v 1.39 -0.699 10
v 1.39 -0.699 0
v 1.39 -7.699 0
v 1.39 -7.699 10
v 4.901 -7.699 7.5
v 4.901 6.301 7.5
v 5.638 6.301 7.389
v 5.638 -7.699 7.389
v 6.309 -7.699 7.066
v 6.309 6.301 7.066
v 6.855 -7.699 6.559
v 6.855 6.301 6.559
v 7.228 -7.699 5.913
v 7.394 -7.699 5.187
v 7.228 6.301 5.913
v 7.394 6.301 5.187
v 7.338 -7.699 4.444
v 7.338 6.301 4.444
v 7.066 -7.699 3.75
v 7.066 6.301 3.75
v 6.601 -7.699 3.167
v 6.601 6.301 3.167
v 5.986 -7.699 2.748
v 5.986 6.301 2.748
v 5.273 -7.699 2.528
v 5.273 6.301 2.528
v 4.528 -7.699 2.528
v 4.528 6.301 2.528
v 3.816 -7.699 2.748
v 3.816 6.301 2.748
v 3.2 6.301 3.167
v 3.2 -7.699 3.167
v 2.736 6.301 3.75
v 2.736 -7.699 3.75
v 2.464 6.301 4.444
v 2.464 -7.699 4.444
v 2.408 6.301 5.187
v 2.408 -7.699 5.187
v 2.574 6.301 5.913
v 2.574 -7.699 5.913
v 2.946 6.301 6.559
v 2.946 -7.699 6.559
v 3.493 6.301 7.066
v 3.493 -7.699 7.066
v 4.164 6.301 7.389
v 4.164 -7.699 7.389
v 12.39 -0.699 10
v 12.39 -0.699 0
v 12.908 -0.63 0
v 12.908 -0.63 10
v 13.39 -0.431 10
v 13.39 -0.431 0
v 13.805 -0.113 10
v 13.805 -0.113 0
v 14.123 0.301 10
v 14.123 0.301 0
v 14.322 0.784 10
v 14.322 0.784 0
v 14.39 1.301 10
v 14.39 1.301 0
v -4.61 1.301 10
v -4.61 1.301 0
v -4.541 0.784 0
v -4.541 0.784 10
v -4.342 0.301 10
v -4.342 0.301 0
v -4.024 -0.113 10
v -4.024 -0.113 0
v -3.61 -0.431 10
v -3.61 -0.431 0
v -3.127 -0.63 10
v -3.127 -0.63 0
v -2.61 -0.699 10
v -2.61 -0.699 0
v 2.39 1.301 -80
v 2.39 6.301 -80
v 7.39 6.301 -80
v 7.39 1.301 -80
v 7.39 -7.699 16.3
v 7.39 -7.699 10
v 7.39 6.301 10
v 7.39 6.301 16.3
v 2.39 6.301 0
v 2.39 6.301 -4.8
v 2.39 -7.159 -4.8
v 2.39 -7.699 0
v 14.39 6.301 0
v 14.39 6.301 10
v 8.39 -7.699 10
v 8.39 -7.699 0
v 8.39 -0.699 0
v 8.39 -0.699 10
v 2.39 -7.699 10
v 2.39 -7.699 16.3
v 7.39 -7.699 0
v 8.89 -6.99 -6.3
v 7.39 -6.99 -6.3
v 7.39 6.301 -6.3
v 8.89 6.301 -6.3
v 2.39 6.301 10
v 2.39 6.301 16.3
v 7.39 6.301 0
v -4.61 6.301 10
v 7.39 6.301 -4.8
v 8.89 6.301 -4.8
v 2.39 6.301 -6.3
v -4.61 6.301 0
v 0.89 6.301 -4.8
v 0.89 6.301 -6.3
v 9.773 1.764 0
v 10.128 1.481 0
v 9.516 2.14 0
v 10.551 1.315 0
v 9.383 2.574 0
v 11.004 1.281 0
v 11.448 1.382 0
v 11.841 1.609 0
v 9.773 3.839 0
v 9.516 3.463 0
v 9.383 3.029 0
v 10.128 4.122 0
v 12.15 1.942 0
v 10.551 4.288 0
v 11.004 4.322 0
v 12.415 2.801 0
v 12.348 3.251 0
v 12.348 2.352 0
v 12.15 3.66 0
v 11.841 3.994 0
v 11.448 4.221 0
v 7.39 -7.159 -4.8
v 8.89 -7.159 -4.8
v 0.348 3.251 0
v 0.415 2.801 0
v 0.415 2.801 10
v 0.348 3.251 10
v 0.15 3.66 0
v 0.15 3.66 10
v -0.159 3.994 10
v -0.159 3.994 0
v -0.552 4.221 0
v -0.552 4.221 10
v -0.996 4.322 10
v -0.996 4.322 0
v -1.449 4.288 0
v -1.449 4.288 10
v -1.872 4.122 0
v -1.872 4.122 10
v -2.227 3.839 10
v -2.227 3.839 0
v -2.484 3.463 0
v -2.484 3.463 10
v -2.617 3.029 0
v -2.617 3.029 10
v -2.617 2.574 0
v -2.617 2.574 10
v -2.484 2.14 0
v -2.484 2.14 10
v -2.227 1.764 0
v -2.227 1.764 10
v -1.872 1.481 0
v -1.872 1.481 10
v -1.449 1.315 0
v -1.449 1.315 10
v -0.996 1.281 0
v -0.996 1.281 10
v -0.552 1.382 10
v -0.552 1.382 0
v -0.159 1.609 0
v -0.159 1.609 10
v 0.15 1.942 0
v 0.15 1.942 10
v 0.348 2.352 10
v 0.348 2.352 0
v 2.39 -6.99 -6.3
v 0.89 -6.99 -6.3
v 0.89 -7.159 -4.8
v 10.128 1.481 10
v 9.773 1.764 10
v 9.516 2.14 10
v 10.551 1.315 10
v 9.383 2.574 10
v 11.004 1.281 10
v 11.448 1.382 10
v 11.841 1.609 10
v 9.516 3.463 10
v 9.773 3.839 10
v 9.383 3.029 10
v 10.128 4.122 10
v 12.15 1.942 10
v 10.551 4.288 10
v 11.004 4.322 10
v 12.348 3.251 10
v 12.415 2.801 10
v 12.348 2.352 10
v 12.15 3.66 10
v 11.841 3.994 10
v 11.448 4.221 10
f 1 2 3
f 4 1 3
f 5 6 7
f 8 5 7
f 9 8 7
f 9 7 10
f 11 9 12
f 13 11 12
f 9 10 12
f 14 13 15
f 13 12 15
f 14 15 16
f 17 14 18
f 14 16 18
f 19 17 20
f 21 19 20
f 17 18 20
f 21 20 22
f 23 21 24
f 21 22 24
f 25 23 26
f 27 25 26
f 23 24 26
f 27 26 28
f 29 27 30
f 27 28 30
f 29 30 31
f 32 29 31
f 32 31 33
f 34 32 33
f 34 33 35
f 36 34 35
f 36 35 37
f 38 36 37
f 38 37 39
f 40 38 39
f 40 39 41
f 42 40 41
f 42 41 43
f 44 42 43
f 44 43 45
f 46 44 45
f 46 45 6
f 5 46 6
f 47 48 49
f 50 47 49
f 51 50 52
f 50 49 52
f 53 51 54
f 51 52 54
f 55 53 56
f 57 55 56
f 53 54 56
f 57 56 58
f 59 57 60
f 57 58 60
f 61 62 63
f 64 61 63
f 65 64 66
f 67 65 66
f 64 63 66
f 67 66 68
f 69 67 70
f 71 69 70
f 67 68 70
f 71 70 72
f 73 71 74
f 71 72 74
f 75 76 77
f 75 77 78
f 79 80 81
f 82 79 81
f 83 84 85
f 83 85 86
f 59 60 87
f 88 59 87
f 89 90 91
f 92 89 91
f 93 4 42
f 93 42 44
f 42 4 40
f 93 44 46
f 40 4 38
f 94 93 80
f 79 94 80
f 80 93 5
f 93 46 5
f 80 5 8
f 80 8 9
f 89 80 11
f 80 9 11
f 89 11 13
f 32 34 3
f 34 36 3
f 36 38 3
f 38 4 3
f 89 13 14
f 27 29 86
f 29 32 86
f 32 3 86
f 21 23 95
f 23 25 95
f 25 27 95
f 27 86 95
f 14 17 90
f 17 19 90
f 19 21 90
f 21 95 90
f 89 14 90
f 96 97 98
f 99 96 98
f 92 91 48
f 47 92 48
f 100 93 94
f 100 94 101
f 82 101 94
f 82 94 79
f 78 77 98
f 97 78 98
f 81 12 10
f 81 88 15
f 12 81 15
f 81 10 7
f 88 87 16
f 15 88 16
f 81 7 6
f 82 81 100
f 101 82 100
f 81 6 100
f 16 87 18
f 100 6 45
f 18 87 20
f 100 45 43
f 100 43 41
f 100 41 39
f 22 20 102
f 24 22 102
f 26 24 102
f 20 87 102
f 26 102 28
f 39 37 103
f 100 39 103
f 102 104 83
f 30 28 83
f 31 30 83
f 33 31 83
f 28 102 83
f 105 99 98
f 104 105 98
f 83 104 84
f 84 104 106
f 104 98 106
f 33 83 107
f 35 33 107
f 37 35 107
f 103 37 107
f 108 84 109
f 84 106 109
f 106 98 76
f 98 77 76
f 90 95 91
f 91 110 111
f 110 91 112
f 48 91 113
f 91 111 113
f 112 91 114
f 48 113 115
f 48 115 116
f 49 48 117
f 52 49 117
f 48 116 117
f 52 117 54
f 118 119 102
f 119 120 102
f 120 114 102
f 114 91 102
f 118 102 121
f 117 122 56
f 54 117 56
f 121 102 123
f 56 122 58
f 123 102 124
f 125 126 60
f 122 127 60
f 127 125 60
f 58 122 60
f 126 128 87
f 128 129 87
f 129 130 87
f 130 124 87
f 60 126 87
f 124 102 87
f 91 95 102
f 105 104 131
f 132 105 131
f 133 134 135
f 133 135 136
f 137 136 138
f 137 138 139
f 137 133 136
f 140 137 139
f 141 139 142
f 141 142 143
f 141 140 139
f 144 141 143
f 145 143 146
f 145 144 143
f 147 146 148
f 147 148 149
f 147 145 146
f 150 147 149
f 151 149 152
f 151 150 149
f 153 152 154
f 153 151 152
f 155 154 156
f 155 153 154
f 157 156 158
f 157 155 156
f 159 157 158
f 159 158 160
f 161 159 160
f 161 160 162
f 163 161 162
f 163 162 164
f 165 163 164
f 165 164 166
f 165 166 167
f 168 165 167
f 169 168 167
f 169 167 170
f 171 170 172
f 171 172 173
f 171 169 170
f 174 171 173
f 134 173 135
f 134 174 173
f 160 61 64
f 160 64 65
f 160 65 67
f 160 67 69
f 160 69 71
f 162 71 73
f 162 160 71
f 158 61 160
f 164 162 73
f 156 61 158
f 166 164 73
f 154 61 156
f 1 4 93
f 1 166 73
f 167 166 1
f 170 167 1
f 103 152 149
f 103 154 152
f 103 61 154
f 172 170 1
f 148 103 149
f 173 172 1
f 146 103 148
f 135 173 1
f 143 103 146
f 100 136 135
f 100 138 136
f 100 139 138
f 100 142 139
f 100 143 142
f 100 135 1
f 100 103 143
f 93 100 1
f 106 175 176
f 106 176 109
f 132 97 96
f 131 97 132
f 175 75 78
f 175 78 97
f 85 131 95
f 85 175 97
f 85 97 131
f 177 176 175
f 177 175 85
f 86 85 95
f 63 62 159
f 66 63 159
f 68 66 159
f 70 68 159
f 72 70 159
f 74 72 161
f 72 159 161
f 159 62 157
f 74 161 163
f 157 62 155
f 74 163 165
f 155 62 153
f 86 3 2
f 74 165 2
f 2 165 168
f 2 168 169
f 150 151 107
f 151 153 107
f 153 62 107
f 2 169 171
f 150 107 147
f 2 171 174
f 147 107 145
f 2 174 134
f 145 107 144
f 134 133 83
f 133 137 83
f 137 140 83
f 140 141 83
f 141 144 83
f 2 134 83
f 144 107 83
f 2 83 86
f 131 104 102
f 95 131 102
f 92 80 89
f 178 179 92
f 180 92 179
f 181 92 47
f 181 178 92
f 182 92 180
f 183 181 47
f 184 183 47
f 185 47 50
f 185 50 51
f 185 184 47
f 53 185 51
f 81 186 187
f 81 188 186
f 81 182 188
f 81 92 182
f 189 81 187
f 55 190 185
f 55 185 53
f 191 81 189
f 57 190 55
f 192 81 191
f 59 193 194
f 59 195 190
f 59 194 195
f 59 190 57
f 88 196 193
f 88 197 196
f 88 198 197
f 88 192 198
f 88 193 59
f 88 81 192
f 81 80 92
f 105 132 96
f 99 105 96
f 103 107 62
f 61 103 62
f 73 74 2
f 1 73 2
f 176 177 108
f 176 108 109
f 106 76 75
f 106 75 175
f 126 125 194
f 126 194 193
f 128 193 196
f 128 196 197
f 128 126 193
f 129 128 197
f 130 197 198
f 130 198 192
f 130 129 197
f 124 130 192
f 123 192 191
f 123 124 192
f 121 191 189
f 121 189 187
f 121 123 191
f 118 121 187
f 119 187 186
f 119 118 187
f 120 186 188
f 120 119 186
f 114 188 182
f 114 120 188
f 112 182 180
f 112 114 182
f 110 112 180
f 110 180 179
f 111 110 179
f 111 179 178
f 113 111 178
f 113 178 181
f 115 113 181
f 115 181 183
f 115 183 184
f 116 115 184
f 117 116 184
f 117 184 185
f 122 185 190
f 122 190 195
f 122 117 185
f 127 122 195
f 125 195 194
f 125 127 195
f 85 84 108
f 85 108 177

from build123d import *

# Parameters (mm, degrees)
SKETCH_1_R           = 1.525
EXTRUDE_1_DEPTH      = 10
EXTRUDE_2_DEPTH      = 2.5
EXTRUDE_2_DEPTH_BACK = 2.5
SKETCH_4_W           = 5
SKETCH_4_H           = 14
EXTRUDE_3_DEPTH      = 6.3
CUT_EXTRUDE_1_REACH  = 84.481
SKETCH_5_R           = 2.5
EXTRUDE_5_DEPTH      = 1.5


with BuildPart() as part:
    # 草图1 → 凸台-拉伸1 (new body)
    with BuildSketch(Plane.XY):
        with BuildLine():
            Line((-4.609526623, 6.301360946), (-4.609526623, 1.301360946))
            ThreePointArc((-4.609526623, 1.301360946), (-4.023740186, -0.112852616), (-2.609526623, -0.698639054))
            Line((-2.609526623, -0.698639054), (1.390473377, -0.698639054))
            Line((1.390473377, -0.698639054), (1.390473377, -7.698639054))
            Line((1.390473377, -7.698639054), (8.390473377, -7.698639054))
            Line((8.390473377, -7.698639054), (8.390473377, -0.698639054))
            Line((8.390473377, -0.698639054), (12.390473377, -0.698639054))
            ThreePointArc((12.390473377, -0.698639054), (13.804686939, -0.112852616), (14.390473377, 1.301360946))
            Line((14.390473377, 1.301360946), (14.390473377, 6.301360946))
            Line((14.390473377, 6.301360946), (-4.609526623, 6.301360946))
        make_face()
        with Locations((10.890473377, 2.801360946)):
            Circle(SKETCH_1_R, mode=Mode.SUBTRACT)
        with Locations((-1.109526623, 2.801360946)):
            Circle(SKETCH_1_R, mode=Mode.SUBTRACT)
    extrude(amount=EXTRUDE_1_DEPTH)

    # 草图3 → 凸台-拉伸2 (add, two sides: drawn at the far end of the back side and taken through both)
    with BuildSketch(Plane(origin=(4.890473377, 0, 0), x_dir=(0, 0, -1), z_dir=(1, 0, 0)).offset(-EXTRUDE_2_DEPTH_BACK)):
        Polygon((0, 6.301360946), (80, 6.301360946), (80, 1.301360946), (0, -7.698639054), align=None)
    extrude(amount=EXTRUDE_2_DEPTH + EXTRUDE_2_DEPTH_BACK)

    # 草图4 → 凸台-拉伸3 (add)
    with BuildSketch(Plane.XY.offset(10)):
        with Locations((4.890473377, -0.698639054)):
            Rectangle(SKETCH_4_W, SKETCH_4_H)
    extrude(amount=EXTRUDE_3_DEPTH)

    # 草图5 → 切除-拉伸1 (cut, up to next)
    with BuildSketch(Plane(origin=(0, 6.301360946, 0), x_dir=(1, 0, 0), z_dir=(0, 1, 0)), mode=Mode.PRIVATE) as cut_extrude_1_sk1:
        with Locations(Location((4.900882763, -5, 0), (0, 0, 270))):
            Circle(SKETCH_5_R)
    cut_extrude_1_tool1 = extrude(cut_extrude_1_sk1.sketch, amount=-CUT_EXTRUDE_1_REACH, mode=Mode.PRIVATE) & part.part
    add(cut_extrude_1_tool1.solids().sort_by_distance((4.900883, 6.301361, 5))[0], mode=Mode.SUBTRACT)

    # 草图6 → 凸台-拉伸5 (add)
    with BuildSketch(Plane(origin=(7.390473377, 0, 0), x_dir=(0, 0, -1), z_dir=(1, 0, 0))):
        Polygon((6.3, 6.301360946), (4.8, 6.301360946), (4.8, -7.158639054), (6.3, -6.989889054), align=None)
    extrude_5 = extrude(amount=EXTRUDE_5_DEPTH)

    # 镜向1: 凸台-拉伸5 across plane
    add(extrude_5.mirror(Plane(origin=(4.890473377, 0, 0), x_dir=(0, 0, 1), z_dir=(1, 0, 0))))


solid = part.part
